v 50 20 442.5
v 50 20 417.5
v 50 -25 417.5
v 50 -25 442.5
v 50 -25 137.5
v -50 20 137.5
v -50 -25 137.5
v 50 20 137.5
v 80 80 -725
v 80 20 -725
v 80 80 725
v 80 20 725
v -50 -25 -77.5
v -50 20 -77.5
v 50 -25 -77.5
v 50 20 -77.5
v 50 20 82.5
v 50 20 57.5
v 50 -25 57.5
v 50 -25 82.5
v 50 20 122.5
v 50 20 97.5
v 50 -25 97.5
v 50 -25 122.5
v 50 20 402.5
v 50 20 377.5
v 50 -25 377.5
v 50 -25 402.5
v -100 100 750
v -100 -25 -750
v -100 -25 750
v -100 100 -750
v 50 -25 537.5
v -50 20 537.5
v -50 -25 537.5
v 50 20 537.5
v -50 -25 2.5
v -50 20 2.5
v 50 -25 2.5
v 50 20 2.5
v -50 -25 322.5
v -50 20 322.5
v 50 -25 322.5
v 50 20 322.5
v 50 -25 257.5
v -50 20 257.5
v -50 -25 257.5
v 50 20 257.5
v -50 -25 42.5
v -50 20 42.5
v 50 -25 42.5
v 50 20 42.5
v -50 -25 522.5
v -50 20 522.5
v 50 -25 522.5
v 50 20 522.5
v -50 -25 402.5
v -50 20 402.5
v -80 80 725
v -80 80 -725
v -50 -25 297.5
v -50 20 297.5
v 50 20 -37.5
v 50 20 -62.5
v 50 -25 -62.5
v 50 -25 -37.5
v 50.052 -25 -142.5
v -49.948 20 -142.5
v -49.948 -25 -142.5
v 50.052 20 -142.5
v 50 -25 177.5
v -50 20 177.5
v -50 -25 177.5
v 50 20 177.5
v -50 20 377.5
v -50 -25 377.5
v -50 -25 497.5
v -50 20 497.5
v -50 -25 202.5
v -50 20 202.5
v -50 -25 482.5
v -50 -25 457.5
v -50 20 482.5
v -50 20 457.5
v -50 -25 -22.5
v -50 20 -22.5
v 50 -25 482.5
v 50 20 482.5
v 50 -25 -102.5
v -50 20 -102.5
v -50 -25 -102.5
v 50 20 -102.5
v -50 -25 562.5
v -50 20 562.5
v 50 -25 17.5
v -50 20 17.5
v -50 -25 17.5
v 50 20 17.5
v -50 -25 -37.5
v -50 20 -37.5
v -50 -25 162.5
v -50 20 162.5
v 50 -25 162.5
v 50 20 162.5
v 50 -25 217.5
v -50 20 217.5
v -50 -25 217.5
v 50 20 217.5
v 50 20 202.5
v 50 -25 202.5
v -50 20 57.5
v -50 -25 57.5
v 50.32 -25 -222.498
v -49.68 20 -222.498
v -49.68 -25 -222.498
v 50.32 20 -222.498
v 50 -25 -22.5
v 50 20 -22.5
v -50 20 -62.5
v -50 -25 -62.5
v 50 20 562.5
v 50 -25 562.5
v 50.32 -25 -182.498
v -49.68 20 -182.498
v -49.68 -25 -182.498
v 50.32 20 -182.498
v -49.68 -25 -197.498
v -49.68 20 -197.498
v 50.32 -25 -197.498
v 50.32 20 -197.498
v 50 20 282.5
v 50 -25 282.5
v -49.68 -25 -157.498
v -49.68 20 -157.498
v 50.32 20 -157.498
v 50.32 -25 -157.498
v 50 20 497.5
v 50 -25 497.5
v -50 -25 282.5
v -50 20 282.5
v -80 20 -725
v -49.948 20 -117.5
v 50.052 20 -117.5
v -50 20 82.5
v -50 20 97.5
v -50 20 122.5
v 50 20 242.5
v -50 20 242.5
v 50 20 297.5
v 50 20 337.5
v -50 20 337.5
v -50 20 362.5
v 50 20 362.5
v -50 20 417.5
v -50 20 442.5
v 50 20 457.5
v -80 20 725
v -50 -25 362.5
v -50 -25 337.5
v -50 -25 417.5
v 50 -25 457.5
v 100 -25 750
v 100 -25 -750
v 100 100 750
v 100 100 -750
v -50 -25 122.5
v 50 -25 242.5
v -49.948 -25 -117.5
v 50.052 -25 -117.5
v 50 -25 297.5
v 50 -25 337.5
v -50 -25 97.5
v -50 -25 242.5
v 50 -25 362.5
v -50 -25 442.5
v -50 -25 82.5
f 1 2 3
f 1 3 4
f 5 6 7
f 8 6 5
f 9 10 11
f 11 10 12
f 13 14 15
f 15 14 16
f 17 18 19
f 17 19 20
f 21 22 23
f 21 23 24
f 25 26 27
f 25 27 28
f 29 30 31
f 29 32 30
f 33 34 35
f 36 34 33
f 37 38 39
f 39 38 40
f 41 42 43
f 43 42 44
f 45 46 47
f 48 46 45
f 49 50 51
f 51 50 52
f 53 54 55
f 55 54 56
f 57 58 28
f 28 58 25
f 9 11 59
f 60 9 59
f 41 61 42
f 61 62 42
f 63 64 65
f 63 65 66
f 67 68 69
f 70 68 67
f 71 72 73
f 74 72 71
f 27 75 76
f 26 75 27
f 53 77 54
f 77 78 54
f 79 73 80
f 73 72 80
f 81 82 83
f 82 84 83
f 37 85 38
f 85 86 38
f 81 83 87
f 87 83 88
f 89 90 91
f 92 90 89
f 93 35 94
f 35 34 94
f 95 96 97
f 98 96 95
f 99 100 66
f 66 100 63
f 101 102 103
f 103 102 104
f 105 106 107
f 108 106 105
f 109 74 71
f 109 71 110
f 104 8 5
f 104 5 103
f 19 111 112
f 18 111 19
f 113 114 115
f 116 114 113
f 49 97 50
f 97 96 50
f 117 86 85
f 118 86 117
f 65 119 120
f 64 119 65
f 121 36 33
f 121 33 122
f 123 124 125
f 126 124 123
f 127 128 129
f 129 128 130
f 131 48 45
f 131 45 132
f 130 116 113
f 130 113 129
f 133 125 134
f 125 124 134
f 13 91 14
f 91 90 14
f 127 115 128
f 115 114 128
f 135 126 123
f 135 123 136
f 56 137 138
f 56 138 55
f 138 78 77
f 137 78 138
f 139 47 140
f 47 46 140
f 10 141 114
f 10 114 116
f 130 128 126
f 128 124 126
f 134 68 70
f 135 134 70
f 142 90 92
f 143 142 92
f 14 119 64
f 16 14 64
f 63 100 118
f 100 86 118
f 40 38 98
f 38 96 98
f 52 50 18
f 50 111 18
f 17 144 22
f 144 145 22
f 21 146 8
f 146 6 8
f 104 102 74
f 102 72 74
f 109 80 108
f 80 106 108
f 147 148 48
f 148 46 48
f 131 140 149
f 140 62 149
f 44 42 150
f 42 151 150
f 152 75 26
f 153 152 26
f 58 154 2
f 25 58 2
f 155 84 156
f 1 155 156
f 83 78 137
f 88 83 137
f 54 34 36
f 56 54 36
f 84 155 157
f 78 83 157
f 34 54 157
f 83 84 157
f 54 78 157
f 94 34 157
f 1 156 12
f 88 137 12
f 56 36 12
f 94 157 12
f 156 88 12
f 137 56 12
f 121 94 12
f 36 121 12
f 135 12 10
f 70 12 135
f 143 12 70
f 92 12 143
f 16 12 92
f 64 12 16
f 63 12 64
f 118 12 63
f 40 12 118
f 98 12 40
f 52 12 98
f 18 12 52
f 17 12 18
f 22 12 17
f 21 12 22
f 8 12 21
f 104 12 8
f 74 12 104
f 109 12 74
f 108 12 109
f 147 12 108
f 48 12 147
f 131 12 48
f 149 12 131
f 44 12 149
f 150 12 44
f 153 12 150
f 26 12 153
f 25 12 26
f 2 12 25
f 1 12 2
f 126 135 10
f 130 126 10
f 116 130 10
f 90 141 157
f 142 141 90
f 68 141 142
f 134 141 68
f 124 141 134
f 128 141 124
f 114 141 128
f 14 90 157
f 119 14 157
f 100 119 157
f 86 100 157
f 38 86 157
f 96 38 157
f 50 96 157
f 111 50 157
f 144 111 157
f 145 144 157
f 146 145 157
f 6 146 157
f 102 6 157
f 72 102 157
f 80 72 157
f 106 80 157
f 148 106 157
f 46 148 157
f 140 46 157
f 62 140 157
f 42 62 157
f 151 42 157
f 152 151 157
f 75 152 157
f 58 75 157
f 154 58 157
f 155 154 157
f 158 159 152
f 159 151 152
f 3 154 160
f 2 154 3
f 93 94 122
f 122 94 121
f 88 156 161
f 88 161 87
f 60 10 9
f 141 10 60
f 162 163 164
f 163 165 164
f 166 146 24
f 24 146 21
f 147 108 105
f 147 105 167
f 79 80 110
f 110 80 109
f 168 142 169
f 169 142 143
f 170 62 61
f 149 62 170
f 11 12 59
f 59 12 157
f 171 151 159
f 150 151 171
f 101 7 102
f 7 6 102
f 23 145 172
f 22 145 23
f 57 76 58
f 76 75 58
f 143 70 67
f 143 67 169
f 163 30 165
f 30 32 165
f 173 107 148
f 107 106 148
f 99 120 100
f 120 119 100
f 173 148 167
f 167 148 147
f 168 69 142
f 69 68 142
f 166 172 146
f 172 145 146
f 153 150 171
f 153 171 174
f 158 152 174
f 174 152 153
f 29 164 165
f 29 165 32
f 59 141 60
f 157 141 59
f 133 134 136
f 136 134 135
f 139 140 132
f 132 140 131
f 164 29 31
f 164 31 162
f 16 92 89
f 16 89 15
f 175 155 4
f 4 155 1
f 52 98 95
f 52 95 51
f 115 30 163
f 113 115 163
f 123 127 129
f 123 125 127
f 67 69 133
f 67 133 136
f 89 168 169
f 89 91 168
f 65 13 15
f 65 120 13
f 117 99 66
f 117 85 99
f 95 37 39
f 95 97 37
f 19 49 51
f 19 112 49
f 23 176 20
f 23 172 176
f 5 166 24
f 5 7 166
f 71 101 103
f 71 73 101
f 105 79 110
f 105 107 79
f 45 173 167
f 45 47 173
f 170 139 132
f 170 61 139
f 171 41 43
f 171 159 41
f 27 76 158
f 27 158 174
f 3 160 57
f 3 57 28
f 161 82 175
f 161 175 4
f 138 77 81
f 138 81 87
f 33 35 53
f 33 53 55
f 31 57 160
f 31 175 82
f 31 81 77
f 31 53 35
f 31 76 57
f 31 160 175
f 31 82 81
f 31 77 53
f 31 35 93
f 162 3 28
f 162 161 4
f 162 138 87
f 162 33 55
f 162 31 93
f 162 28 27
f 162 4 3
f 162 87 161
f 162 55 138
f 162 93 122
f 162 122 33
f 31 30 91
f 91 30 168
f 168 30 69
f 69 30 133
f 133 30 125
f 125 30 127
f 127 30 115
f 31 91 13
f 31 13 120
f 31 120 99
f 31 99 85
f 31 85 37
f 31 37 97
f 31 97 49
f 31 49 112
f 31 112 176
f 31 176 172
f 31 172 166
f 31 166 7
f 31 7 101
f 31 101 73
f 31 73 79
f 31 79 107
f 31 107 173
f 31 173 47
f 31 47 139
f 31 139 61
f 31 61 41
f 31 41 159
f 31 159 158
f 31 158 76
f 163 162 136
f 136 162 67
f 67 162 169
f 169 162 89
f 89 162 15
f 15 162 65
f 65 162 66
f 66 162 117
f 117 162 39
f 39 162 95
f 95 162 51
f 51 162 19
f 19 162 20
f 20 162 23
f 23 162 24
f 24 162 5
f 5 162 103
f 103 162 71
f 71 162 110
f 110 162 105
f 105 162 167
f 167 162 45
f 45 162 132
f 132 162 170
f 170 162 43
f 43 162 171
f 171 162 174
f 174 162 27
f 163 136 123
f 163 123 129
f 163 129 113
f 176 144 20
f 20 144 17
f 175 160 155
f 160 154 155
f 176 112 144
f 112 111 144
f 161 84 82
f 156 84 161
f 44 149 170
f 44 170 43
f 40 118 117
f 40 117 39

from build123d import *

# Parameters (mm, degrees)
F0_W     = 200
F0_H     = 1500
F0_W_2   = 100
F0_H_2   = 25
F1_DEPTH = 20
F2_W     = 200
F2_H     = 1500
F2_W_2   = 160
F2_H_2   = 1450
F3_DEPTH = 60
F4_W     = 200
F4_H     = 1500
F5_DEPTH = 20
F6_DEPTH = 25


with BuildPart() as f1:
    # F0 (on Front) → F1 (new body)
    with BuildSketch(Plane.XZ):
        Rectangle(F0_W, F0_H)
        with Locations((0.320368, -209.9976)):
            Rectangle(F0_W_2, F0_H_2, mode=Mode.SUBTRACT)
        with Locations((0.320368, -169.9976)):
            Rectangle(F0_W_2, F0_H_2, mode=Mode.SUBTRACT)
        with Locations((0.052069, -130)):
            Rectangle(F0_W_2, F0_H_2, mode=Mode.SUBTRACT)
        with Locations((0, -90)):
            Rectangle(F0_W_2, F0_H_2, mode=Mode.SUBTRACT)
        with Locations((0, -50)):
            Rectangle(F0_W_2, F0_H_2, mode=Mode.SUBTRACT)
        with Locations((0, -10)):
            Rectangle(F0_W_2, F0_H_2, mode=Mode.SUBTRACT)
        with Locations((0, 30)):
            Rectangle(F0_W_2, F0_H_2, mode=Mode.SUBTRACT)
        with Locations((0, 70)):
            Rectangle(F0_W_2, F0_H_2, mode=Mode.SUBTRACT)
        with Locations((0, 110)):
            Rectangle(F0_W_2, F0_H_2, mode=Mode.SUBTRACT)
        with Locations((0, 150)):
            Rectangle(F0_W_2, F0_H_2, mode=Mode.SUBTRACT)
        with Locations((0, 190)):
            Rectangle(F0_W_2, F0_H_2, mode=Mode.SUBTRACT)
        with Locations((0, 230)):
            Rectangle(F0_W_2, F0_H_2, mode=Mode.SUBTRACT)
        with Locations((0, 270)):
            Rectangle(F0_W_2, F0_H_2, mode=Mode.SUBTRACT)
        with Locations((0, 310)):
            Rectangle(F0_W_2, F0_H_2, mode=Mode.SUBTRACT)
        with Locations((0, 350)):
            Rectangle(F0_W_2, F0_H_2, mode=Mode.SUBTRACT)
        with Locations((0, 390)):
            Rectangle(F0_W_2, F0_H_2, mode=Mode.SUBTRACT)
        with Locations((0, 430)):
            Rectangle(F0_W_2, F0_H_2, mode=Mode.SUBTRACT)
        with Locations((0, 470)):
            Rectangle(F0_W_2, F0_H_2, mode=Mode.SUBTRACT)
        with Locations((0, 510)):
            Rectangle(F0_W_2, F0_H_2, mode=Mode.SUBTRACT)
        with Locations((0, 550)):
            Rectangle(F0_W_2, F0_H_2, mode=Mode.SUBTRACT)
    extrude(amount=-F1_DEPTH)

    # F2 (on face) → F3 (join)
    with BuildSketch(Plane(origin=(0, 20, 0), x_dir=(-1, 0, 0), z_dir=(0, 1, 0))):
        Rectangle(F2_W, F2_H)
        Rectangle(F2_W_2, F2_H_2, mode=Mode.SUBTRACT)
    extrude(amount=F3_DEPTH)

    # F4 (on face) → F5 (join)
    with BuildSketch(Plane(origin=(0, 80, 0), x_dir=(-1, 0, 0), z_dir=(0, 1, 0))):
        Rectangle(F4_W, F4_H)
    extrude(amount=F5_DEPTH)

    # F0 (on Front) → F6 (join)
    with BuildSketch(Plane.XZ):
        Rectangle(F0_W, F0_H)
        with Locations((0.320368, -209.9976)):
            Rectangle(F0_W_2, F0_H_2, mode=Mode.SUBTRACT)
        with Locations((0.320368, -169.9976)):
            Rectangle(F0_W_2, F0_H_2, mode=Mode.SUBTRACT)
        with Locations((0.052069, -130)):
            Rectangle(F0_W_2, F0_H_2, mode=Mode.SUBTRACT)
        with Locations((0, -90)):
            Rectangle(F0_W_2, F0_H_2, mode=Mode.SUBTRACT)
        with Locations((0, -50)):
            Rectangle(F0_W_2, F0_H_2, mode=Mode.SUBTRACT)
        with Locations((0, -10)):
            Rectangle(F0_W_2, F0_H_2, mode=Mode.SUBTRACT)
        with Locations((0, 30)):
            Rectangle(F0_W_2, F0_H_2, mode=Mode.SUBTRACT)
        with Locations((0, 70)):
            Rectangle(F0_W_2, F0_H_2, mode=Mode.SUBTRACT)
        with Locations((0, 110)):
            Rectangle(F0_W_2, F0_H_2, mode=Mode.SUBTRACT)
        with Locations((0, 150)):
            Rectangle(F0_W_2, F0_H_2, mode=Mode.SUBTRACT)
        with Locations((0, 190)):
            Rectangle(F0_W_2, F0_H_2, mode=Mode.SUBTRACT)
        with Locations((0, 230)):
            Rectangle(F0_W_2, F0_H_2, mode=Mode.SUBTRACT)
        with Locations((0, 270)):
            Rectangle(F0_W_2, F0_H_2, mode=Mode.SUBTRACT)
        with Locations((0, 310)):
            Rectangle(F0_W_2, F0_H_2, mode=Mode.SUBTRACT)
        with Locations((0, 350)):
            Rectangle(F0_W_2, F0_H_2, mode=Mode.SUBTRACT)
        with Locations((0, 390)):
            Rectangle(F0_W_2, F0_H_2, mode=Mode.SUBTRACT)
        with Locations((0, 430)):
            Rectangle(F0_W_2, F0_H_2, mode=Mode.SUBTRACT)
        with Locations((0, 470)):
            Rectangle(F0_W_2, F0_H_2, mode=Mode.SUBTRACT)
        with Locations((0, 510)):
            Rectangle(F0_W_2, F0_H_2, mode=Mode.SUBTRACT)
        with Locations((0, 550)):
            Rectangle(F0_W_2, F0_H_2, mode=Mode.SUBTRACT)
    extrude(amount=F6_DEPTH)


solid = f1.part
